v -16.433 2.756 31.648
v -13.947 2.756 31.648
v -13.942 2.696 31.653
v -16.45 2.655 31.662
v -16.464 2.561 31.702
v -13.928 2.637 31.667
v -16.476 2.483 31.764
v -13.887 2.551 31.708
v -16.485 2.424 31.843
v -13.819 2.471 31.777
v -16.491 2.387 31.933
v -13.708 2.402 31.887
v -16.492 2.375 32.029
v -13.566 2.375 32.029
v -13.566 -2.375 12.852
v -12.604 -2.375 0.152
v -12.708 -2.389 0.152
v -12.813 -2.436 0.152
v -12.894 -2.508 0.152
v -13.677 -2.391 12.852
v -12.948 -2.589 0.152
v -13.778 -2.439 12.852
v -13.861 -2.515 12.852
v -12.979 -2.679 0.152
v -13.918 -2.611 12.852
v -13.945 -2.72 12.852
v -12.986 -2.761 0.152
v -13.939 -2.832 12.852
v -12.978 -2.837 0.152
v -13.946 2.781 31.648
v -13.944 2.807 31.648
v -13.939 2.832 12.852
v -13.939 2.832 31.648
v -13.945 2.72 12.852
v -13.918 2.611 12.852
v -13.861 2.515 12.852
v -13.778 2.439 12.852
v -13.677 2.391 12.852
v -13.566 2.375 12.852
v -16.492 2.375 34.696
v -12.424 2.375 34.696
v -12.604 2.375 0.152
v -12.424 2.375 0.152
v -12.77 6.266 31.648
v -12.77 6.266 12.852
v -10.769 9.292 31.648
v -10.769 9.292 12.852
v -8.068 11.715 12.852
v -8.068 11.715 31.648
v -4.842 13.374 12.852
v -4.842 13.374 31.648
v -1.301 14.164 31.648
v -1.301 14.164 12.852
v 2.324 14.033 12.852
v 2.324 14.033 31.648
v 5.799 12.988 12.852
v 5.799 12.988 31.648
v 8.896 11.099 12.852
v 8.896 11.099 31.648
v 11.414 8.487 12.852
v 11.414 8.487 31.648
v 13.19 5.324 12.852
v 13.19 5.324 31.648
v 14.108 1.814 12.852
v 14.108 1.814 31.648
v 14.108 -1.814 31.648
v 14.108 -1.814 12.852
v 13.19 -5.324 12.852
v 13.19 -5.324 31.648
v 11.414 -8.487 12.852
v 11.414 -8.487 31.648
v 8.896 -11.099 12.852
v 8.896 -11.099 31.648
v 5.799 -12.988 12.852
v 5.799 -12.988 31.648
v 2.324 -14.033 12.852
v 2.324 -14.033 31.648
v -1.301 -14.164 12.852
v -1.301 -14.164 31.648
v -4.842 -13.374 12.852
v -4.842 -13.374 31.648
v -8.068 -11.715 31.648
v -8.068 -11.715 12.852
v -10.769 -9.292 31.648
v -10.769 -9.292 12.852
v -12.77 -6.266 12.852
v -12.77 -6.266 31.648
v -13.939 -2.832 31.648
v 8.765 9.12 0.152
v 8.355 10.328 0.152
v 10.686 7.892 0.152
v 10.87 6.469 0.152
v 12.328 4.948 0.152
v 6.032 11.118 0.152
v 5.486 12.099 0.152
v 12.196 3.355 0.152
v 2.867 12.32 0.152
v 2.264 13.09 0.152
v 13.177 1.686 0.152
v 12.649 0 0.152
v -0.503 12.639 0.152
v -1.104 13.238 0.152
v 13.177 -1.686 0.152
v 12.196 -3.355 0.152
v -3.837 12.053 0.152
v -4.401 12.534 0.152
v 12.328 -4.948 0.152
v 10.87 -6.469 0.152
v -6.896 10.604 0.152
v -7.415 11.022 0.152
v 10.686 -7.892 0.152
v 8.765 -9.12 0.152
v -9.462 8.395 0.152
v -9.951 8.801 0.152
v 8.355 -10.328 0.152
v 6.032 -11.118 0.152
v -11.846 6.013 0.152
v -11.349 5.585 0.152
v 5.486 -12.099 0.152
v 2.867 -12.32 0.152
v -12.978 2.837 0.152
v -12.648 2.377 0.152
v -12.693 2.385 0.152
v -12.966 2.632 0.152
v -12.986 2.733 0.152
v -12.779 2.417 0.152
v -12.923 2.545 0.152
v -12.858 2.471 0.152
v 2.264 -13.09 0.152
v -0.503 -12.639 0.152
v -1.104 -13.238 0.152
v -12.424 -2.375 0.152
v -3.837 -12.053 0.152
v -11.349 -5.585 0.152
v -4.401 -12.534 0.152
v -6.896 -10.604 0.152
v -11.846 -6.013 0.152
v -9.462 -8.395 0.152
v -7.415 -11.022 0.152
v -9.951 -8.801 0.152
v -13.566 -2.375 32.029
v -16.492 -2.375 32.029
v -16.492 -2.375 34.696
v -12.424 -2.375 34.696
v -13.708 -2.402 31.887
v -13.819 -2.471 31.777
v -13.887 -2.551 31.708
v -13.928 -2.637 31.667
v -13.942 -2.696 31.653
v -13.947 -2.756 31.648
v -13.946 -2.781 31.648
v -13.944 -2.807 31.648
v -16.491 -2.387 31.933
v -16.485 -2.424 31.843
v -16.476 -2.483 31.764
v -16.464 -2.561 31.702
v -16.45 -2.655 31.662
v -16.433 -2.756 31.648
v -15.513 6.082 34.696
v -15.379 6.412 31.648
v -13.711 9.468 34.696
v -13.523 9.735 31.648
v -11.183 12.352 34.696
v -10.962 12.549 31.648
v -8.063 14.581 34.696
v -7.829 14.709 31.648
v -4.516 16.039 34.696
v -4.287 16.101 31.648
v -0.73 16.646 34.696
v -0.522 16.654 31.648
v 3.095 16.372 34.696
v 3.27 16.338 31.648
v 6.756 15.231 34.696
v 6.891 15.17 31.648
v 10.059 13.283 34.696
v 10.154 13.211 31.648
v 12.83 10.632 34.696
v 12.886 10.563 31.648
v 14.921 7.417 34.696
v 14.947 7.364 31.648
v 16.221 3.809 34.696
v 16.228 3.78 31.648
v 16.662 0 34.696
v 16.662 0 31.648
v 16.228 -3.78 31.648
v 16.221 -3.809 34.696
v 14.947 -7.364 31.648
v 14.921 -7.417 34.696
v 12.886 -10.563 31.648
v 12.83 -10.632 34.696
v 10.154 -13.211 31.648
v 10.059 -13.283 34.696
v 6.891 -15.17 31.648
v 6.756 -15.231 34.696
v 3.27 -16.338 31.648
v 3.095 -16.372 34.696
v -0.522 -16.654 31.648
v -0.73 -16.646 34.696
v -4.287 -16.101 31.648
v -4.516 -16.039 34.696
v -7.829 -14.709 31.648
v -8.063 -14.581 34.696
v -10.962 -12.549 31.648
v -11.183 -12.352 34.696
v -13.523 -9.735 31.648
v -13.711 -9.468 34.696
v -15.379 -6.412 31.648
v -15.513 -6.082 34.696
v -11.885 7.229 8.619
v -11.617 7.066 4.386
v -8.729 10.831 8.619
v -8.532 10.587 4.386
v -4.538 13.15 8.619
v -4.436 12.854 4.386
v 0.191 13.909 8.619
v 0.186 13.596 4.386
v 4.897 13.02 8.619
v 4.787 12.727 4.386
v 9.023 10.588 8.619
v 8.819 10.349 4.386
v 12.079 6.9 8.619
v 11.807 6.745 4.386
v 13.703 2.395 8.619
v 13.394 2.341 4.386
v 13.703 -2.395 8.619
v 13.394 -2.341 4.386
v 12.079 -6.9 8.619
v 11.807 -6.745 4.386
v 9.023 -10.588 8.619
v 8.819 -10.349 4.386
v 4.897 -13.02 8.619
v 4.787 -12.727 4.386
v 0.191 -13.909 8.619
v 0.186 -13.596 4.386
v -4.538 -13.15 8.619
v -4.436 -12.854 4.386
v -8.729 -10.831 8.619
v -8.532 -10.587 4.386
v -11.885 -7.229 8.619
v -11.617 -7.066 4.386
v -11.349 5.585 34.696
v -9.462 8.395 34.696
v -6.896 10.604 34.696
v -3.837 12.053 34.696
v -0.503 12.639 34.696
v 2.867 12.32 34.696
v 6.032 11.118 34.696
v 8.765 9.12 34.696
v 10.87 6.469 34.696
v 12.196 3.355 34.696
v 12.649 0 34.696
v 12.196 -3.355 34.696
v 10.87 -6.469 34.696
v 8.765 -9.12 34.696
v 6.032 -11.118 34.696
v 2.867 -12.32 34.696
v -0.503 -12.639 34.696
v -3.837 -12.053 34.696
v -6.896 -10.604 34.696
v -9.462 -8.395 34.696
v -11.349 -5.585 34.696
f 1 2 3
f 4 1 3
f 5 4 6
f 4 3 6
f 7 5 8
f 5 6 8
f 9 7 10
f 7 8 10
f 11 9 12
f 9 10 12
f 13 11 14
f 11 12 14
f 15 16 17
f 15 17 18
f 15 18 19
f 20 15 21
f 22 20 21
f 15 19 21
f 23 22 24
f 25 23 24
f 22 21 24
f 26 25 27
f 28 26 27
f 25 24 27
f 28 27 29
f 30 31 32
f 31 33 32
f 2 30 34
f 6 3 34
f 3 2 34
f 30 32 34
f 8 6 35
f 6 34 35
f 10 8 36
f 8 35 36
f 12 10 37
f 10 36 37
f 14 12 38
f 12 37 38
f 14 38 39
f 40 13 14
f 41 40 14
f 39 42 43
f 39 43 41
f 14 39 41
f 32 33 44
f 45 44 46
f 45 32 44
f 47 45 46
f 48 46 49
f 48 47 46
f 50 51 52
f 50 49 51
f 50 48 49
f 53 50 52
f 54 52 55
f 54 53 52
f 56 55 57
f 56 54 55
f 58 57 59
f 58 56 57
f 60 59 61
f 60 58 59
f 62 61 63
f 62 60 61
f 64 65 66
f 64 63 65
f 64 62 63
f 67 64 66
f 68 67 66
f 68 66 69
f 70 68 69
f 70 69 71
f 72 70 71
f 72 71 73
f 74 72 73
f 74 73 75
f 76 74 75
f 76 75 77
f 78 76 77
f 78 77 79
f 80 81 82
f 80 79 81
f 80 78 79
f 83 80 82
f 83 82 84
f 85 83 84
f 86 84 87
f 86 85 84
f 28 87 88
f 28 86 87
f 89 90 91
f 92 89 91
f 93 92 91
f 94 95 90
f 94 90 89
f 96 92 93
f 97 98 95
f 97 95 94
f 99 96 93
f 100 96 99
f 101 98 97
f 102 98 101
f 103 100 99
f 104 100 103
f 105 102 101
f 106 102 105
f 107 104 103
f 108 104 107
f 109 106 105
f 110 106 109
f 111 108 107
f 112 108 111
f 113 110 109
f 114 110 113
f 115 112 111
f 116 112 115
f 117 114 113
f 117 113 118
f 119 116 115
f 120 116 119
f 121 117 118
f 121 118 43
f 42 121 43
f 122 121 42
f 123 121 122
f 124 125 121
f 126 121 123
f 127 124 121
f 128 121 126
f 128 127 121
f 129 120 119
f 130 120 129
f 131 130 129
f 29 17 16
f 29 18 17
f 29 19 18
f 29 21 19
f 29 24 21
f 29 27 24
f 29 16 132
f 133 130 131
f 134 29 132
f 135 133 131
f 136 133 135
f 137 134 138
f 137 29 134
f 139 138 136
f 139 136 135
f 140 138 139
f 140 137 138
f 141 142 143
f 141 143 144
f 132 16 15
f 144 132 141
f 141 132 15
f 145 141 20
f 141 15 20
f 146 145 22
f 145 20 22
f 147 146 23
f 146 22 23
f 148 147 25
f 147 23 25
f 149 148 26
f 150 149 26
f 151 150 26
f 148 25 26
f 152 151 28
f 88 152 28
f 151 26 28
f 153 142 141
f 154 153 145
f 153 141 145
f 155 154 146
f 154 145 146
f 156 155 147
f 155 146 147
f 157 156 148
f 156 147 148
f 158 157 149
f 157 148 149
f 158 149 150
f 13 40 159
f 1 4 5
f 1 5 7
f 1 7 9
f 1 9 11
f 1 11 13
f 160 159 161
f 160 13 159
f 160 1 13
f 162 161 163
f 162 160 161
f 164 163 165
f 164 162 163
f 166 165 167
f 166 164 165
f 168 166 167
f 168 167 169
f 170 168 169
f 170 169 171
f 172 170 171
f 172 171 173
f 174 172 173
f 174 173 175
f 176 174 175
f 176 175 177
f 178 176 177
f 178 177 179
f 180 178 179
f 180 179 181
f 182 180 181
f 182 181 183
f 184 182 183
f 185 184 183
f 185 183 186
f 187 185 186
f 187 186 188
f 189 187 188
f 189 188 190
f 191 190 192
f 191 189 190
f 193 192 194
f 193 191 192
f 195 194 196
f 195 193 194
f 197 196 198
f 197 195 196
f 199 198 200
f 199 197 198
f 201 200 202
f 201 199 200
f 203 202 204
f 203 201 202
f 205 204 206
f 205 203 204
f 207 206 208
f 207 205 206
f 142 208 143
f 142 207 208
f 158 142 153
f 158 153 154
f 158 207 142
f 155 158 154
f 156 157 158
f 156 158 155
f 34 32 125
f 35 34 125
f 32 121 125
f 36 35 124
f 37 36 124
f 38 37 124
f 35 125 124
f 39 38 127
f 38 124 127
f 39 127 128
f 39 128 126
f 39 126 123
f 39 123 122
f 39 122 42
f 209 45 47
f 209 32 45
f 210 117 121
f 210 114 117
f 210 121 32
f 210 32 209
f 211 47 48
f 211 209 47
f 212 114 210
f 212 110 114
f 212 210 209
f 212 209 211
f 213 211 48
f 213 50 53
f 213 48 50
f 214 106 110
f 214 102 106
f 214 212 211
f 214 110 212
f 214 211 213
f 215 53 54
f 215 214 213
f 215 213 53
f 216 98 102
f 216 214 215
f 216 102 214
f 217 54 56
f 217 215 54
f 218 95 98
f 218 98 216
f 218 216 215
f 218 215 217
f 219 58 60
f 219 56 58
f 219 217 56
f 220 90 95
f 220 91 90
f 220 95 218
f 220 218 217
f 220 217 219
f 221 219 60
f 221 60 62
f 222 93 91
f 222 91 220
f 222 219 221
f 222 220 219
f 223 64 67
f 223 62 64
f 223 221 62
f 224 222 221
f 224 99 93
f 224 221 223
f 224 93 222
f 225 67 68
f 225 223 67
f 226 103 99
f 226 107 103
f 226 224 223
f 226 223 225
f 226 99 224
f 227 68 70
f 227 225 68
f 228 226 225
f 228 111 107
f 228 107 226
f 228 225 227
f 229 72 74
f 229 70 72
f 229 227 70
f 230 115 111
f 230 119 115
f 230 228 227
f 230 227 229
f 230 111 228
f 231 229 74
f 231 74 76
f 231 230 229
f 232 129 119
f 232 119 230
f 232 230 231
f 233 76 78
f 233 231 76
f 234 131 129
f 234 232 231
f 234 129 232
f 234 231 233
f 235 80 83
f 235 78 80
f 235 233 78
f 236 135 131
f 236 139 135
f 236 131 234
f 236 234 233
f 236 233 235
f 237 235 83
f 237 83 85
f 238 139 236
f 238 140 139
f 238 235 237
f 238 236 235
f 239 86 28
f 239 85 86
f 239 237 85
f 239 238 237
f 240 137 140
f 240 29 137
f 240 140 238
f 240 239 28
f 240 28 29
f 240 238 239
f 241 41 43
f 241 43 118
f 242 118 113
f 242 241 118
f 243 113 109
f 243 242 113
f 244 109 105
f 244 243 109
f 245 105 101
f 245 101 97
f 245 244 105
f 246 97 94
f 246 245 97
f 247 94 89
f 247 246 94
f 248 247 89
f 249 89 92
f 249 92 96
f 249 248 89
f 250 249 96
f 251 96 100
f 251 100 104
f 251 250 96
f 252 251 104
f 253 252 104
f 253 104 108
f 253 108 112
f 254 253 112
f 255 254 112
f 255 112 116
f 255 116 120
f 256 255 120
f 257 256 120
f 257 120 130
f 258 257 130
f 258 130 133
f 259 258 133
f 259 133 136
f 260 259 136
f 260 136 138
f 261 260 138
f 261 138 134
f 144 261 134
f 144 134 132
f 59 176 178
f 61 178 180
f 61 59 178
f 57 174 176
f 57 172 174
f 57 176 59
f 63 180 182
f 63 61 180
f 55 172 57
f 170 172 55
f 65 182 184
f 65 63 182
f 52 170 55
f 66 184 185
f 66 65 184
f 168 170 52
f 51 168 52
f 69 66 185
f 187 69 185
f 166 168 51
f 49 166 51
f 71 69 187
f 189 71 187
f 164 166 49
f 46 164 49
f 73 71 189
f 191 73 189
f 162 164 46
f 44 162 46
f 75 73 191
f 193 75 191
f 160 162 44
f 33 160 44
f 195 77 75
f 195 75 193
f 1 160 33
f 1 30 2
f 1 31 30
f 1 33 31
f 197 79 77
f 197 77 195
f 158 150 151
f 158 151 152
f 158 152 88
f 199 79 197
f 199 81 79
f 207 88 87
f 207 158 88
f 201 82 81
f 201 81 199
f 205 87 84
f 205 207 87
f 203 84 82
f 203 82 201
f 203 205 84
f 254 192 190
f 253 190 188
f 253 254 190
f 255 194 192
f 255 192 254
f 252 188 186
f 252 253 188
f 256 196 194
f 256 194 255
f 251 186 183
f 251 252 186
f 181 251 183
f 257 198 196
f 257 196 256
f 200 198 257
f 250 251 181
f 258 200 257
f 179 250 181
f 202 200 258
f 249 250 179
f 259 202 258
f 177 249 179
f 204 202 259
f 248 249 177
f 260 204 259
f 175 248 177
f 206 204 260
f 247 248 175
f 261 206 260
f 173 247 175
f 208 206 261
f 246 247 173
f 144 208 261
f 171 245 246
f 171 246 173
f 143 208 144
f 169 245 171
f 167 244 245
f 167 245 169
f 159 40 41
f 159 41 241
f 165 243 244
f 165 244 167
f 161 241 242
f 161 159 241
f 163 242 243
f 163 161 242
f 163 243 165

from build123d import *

# Parameters (mm, degrees)
F2_W     = 25.146
F2_H     = 4.7498
F3_DEPTH = 34.6974
F4_R     = 0.381


with BuildPart() as f1:
    # F0 (on Right) → F1 (revolve)
    with BuildSketch(Plane.YZ):
        Polygon((-12.6492, 0.1524), (-12.6492, 34.6964), (-16.6624, 34.6964), (-16.6624, 31.6484), (-14.224, 31.6484), (-14.224, 12.8524), (-13.2842, 0.1524), align=None)
    revolve(axis=Axis((0, 0, 4.6482), (0, 0, -1)))

    # F2 (on Top) → F3 (cut, through all)
    with BuildSketch(Plane.XY):
        with Locations((-12.827, 0)):
            Rectangle(F2_W, F2_H)
    extrude(amount=F3_DEPTH, mode=Mode.SUBTRACT)

    # F4
    f4_edges = [f1.edges().sort_by_distance(p)[0] for p in [
        (-13.547512, -2.3749, 6.502381),
        (-14.024337, -2.3749, 22.2504),
        (-13.547512, 2.3749, 6.502381),
        (-14.024337, 2.3749, 22.2504),
        (-15.25831, -2.3749, 31.6484),
        (-15.25831, 2.3749, 31.6484),
    ]]
    fillet(f4_edges, radius=F4_R)


solid = f1.part
